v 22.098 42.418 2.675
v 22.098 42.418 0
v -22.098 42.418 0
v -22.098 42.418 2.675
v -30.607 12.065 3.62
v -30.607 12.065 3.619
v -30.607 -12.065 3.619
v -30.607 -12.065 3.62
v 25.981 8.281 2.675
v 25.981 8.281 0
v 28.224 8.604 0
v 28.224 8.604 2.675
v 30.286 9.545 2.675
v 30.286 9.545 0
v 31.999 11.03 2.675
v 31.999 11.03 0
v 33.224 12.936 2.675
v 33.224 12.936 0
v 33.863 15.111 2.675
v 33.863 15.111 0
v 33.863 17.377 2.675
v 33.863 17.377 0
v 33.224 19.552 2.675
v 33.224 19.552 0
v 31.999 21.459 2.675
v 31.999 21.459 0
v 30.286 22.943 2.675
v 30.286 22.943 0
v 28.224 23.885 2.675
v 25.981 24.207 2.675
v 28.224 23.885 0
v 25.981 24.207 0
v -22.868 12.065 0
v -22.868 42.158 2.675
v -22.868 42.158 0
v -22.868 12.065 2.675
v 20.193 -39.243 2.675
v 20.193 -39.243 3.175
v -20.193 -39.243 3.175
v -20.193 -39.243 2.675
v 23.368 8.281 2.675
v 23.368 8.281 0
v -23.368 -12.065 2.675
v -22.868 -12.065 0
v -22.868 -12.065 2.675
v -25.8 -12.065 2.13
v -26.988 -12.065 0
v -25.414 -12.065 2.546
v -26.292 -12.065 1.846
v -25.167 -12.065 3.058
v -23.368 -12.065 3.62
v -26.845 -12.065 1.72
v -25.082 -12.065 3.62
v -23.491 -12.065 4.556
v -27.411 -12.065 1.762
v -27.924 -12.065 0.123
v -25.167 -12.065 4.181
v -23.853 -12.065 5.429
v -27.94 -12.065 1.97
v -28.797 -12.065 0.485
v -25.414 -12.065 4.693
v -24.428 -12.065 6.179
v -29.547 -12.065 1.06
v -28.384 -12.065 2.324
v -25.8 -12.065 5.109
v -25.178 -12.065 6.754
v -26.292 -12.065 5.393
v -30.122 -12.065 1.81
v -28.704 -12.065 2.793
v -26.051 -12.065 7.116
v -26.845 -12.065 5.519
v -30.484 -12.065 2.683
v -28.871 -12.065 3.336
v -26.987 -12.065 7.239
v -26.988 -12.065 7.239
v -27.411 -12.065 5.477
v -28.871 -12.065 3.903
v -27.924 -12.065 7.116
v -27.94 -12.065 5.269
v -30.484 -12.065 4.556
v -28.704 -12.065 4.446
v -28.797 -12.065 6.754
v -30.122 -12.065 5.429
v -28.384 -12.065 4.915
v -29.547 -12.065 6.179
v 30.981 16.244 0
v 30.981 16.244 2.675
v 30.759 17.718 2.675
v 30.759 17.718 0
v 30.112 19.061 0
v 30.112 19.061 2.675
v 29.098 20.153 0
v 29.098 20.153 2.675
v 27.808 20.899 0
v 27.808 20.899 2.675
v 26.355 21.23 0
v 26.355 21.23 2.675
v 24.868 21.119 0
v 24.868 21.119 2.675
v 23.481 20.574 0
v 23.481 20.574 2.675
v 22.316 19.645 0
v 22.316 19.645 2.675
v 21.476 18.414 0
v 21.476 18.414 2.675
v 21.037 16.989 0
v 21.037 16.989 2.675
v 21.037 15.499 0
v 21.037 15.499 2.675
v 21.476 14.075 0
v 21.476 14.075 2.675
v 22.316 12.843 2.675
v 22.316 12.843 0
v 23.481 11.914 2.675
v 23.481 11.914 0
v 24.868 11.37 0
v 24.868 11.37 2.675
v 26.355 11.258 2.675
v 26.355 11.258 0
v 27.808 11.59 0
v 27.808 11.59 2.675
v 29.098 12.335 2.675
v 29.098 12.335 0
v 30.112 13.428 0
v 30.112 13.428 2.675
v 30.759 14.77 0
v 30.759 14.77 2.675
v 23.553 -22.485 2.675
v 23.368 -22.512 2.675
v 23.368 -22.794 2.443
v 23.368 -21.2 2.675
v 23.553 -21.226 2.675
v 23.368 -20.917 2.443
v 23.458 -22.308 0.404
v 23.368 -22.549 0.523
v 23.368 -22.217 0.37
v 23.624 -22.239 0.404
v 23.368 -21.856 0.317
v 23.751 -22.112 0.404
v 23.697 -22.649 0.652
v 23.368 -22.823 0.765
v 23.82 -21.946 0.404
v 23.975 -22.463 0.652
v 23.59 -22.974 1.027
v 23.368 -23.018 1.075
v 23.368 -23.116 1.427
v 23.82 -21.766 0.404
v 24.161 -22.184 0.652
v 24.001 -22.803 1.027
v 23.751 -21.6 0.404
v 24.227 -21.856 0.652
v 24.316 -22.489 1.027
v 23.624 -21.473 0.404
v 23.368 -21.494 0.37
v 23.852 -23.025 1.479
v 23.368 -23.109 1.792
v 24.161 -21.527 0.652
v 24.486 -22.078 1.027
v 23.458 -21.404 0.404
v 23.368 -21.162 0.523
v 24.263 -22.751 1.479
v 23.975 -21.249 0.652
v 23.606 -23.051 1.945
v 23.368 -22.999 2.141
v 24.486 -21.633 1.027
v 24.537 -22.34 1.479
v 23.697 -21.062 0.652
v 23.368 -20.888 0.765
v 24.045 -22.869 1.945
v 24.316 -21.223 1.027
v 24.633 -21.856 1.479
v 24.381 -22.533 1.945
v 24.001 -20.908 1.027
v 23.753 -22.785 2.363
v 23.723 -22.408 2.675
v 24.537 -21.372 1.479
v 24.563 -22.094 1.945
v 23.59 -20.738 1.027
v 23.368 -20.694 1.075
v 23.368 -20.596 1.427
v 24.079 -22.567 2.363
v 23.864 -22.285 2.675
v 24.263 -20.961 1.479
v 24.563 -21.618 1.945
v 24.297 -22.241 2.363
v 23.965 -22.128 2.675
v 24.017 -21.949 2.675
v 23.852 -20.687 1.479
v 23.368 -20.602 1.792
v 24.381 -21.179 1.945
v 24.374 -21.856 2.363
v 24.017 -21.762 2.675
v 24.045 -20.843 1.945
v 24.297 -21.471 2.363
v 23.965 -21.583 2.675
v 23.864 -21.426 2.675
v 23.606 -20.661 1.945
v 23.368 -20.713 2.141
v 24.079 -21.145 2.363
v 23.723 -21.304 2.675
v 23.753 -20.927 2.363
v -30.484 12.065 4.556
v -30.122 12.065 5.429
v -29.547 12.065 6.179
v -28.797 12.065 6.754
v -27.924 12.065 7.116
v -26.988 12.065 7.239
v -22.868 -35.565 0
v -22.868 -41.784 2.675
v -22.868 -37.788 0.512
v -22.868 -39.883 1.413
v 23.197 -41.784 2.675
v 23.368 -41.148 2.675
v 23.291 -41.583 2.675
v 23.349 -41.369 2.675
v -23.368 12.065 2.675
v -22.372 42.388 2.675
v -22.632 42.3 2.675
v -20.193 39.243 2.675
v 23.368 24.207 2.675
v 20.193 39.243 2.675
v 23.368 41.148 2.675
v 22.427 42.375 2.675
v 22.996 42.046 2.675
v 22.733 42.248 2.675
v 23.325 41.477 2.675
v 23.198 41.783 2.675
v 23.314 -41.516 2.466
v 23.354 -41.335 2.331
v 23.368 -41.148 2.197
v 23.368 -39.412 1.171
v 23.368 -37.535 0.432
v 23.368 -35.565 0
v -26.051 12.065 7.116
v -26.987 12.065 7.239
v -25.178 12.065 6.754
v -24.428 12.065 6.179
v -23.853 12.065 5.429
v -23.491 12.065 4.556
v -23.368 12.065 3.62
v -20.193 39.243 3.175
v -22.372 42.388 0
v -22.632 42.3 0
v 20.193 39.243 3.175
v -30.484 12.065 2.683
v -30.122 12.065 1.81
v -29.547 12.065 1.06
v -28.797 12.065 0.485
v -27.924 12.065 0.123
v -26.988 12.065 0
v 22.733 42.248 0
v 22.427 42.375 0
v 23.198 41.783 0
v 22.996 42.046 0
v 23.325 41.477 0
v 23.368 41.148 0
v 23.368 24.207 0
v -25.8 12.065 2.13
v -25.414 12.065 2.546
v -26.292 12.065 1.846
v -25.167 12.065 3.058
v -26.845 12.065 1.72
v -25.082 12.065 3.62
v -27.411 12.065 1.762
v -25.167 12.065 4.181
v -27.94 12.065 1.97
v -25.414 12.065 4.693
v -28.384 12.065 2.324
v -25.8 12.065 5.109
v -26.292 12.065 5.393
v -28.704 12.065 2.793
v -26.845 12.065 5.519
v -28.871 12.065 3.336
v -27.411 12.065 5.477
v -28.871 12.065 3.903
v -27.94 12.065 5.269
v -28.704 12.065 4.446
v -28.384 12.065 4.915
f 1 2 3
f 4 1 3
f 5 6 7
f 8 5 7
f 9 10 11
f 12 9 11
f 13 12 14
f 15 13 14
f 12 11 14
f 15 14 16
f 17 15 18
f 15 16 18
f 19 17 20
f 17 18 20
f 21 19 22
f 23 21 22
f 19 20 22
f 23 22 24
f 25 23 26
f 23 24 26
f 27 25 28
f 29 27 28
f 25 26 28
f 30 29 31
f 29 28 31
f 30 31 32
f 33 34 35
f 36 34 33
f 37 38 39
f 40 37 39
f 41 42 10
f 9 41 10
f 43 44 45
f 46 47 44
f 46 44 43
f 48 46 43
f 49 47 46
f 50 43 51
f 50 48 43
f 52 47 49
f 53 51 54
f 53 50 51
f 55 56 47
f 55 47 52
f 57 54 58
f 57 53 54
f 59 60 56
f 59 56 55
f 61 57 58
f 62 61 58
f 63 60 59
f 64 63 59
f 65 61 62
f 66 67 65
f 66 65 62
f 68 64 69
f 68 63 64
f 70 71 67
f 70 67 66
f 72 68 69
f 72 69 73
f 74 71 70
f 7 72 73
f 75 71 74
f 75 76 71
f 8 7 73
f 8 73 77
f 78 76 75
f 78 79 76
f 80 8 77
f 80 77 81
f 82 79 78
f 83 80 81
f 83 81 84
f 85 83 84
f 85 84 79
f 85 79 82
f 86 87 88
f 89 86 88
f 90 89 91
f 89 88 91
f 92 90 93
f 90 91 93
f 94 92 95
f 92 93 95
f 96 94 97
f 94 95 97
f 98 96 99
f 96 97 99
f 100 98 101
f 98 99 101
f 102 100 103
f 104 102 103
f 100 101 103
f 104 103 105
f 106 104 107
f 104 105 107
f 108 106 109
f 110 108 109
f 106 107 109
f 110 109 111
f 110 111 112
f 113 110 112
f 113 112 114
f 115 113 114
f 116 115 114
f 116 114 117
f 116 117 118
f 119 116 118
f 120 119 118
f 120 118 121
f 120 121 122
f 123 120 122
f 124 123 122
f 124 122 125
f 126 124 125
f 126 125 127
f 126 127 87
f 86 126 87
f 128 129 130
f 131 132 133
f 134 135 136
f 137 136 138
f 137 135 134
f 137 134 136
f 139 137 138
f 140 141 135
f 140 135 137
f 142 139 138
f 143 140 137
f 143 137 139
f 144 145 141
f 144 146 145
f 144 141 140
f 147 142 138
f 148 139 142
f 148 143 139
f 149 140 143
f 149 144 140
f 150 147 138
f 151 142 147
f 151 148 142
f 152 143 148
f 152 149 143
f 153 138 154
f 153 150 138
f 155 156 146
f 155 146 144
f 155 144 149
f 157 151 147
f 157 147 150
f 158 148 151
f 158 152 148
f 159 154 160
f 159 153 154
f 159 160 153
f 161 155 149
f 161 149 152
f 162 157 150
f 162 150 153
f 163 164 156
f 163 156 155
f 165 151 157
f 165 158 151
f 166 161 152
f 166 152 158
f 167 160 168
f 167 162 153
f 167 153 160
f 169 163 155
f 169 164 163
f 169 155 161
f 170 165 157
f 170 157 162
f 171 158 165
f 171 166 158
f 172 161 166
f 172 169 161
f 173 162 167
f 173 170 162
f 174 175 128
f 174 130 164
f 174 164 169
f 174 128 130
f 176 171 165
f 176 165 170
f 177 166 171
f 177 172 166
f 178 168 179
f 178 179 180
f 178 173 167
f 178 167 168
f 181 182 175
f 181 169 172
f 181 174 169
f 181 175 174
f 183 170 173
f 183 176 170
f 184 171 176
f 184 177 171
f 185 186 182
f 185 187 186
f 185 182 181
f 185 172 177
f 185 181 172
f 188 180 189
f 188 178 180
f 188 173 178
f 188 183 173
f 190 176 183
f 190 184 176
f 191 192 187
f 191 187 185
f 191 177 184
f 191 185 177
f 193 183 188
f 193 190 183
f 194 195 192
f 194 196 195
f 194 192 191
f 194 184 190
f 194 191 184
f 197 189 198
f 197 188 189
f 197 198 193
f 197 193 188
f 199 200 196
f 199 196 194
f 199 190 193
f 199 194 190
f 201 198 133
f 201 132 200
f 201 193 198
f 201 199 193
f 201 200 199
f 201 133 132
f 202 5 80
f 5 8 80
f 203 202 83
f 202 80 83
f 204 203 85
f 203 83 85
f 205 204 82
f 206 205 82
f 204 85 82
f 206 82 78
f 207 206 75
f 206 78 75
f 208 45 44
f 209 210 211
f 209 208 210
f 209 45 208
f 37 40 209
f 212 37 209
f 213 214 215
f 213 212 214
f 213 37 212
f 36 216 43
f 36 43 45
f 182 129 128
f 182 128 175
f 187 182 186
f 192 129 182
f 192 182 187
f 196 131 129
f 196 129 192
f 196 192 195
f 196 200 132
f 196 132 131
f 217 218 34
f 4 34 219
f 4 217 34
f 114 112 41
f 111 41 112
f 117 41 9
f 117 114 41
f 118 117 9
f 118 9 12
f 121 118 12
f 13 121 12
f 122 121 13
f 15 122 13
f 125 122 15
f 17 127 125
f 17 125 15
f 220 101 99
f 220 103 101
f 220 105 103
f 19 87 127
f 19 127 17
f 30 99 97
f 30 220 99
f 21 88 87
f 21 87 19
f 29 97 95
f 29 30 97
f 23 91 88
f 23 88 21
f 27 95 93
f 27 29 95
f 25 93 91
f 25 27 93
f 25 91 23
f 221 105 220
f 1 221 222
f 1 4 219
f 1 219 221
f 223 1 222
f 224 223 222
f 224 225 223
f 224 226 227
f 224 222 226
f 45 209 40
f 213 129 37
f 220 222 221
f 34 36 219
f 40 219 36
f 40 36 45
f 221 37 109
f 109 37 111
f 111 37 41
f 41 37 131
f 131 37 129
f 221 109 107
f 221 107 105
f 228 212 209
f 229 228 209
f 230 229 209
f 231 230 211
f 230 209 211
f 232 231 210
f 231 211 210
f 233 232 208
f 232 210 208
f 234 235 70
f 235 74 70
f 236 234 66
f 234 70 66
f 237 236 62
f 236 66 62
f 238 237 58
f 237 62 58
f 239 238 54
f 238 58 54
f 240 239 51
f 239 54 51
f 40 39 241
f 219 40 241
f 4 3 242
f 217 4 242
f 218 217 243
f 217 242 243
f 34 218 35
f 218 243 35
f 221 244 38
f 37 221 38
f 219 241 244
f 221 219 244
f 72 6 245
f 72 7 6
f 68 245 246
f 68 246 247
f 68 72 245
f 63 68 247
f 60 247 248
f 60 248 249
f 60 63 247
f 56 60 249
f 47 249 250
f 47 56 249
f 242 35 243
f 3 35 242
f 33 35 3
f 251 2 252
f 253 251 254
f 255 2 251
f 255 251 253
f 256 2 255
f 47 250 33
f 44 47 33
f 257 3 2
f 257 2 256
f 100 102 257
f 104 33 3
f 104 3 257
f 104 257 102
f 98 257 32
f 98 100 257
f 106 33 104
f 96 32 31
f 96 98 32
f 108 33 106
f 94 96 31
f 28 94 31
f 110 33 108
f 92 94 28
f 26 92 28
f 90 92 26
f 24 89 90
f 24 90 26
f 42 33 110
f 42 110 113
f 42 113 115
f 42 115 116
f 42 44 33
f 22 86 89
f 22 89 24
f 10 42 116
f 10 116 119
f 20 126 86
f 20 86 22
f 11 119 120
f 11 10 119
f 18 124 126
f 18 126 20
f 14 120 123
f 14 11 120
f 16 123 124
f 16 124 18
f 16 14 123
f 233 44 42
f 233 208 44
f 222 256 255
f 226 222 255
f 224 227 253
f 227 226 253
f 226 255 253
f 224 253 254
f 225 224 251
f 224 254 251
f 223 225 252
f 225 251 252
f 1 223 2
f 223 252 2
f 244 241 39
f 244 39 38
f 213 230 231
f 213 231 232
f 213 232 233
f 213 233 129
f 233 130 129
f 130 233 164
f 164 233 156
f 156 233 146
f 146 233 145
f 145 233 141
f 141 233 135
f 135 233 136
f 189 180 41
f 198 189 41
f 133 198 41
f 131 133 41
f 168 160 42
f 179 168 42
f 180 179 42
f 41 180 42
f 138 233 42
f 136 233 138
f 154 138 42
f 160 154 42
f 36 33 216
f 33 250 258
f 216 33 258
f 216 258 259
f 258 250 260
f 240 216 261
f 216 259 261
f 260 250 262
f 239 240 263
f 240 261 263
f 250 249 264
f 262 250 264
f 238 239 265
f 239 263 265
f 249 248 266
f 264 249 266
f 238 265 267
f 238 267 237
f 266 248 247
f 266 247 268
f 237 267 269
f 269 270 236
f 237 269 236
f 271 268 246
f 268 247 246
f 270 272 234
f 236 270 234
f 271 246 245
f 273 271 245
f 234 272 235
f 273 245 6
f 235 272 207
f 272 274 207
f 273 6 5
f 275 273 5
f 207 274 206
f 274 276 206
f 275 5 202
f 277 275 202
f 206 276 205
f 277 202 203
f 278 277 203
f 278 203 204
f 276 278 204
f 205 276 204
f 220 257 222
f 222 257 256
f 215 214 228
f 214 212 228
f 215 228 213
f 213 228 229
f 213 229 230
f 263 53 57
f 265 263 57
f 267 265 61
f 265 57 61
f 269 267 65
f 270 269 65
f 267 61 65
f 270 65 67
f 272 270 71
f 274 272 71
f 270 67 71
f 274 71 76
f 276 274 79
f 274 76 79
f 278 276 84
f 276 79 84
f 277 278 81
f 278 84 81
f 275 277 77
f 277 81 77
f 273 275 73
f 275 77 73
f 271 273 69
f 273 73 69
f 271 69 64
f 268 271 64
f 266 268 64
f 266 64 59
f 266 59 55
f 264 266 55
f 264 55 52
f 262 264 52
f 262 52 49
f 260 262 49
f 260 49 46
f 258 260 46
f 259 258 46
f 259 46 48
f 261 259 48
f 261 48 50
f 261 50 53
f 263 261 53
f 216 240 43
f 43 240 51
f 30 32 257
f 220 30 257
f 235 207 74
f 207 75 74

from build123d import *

# Parameters (mm, degrees)
F1_DEPTH  = 3.175
F2_R      = 5
F3_DEPTH  = 3.175
F4_W      = 7.239
F4_H      = 24.13
F5_DEPTH  = 7.239
F6_R      = 1.905
F7_DEPTH  = 25.4
F8_R      = 3.6195
F9_R      = 3.61949
F10_R     = 3.61949
F13_W     = 3.2799700804
F13_H     = 6.7503359169
F14_DEPTH = 0.5
F15_W     = 30.353
F15_H     = 2.675
F16_DEPTH = 0.5
F18_DEPTH = 46.236


# Not quite as in the source:
# - a fillet or chamfer is up to 0.001 mm smaller than in the source, because OpenCascade refuses the exact size


with BuildPart() as f1:
    # F0 (on Top) → F1 (new body)
    with BuildSketch(Plane.XY):
        with BuildLine():
            ThreePointArc((23.368, 41.148), (22.9960256121, 42.0460256121), (22.098, 42.418))
            Line((22.098, 42.418), (-22.098, 42.418))
            ThreePointArc((-22.098, 42.418), (-22.9960256121, 42.0460256121), (-23.368, 41.148))
            Line((-23.368, 41.148), (-23.368, -41.148))
            ThreePointArc((-23.368, -41.148), (-22.9960256121, -42.0460256121), (-22.098, -42.418))
            Line((-22.098, -42.418), (22.098, -42.418))
            ThreePointArc((22.098, -42.418), (22.9960256121, -42.0460256121), (23.368, -41.148))
            Line((23.368, -41.148), (23.368, 8.2812636))
            Line((23.368, 8.2812636), (23.368, 24.2070636))
            Line((23.368, 24.2070636), (23.368, 41.148))
        make_face()
        with BuildLine():
            Line((25.980898, 24.2070636), (23.368, 24.2070636))
            Line((23.368, 24.2070636), (23.368, 8.2812636))
            Line((23.368, 8.2812636), (25.980898, 8.2812636))
            ThreePointArc((25.980898, 8.2812636), (33.943798, 16.2441636), (25.980898, 24.2070636))
        make_face()
    extrude(amount=F1_DEPTH)

    # F2 (on face) → F3 (cut)
    with BuildSketch(Plane.XY.offset(3.175)):
        with Locations((25.980898, 16.2441636)):
            Circle(F2_R)
    extrude(amount=-F3_DEPTH, mode=Mode.SUBTRACT)

    # F4 (on face) → F5 (join)
    with BuildSketch(Plane(origin=(0, 0, 0), x_dir=(1, 0, 0), z_dir=(0, 0, -1))):
        with Locations((-26.9875, 0)):
            Rectangle(F4_W, F4_H)
    extrude(amount=-F5_DEPTH)

    # F6 (on face) → F7 (cut)
    with BuildSketch(Plane.XZ.offset(12.065)):
        with Locations((-26.9875, 3.6195)):
            Circle(F6_R)
    extrude(amount=-F7_DEPTH, mode=Mode.SUBTRACT)

    # F8
    f8_edges = [f1.edges().sort_by_distance(p)[0] for p in [
        (-30.607, 0, 7.239),
    ]]
    fillet(f8_edges, radius=F8_R)

    # F9 (radius 3.6195 in the source; OpenCascade refuses exactly that, so slightly less here)
    f9_edges = [f1.edges().sort_by_distance(p)[0] for p in [
        (-23.368, 0, 7.239),
    ]]
    fillet(f9_edges, radius=F9_R)

    # F10 (radius 3.6195 in the source; OpenCascade refuses exactly that, so slightly less here)
    f10_edges = [f1.edges().sort_by_distance(p)[0] for p in [
        (-30.607, 0, 0),
    ]]
    fillet(f10_edges, radius=F10_R)

    # F11 (on face) → F12 (revolve)
    with BuildSketch(Plane.YZ.offset(23.368)):
        with BuildLine():
            Line((-21.8558364, 2.8575), (-21.8558364, 0.3175))
            ThreePointArc((-21.8558364, 0.3175), (-20.5858364, 1.5875), (-21.8558364, 2.8575))
        make_face()
    revolve(axis=Axis((23.368, -21.8558364, 1.4411548618), (0, 0, 1)))

    # F13 (on face) → F14 (cut)
    with BuildSketch(Plane.XY.offset(3.175)):
        with BuildLine():
            Line((-23.368, -12.065), (-23.368, -42.418))
            Line((-23.368, -42.418), (23.368, -42.418))
            Line((23.368, -42.418), (23.368, -25.3541376442))
            Line((23.368, -25.3541376442), (23.368, -18.6038017273))
            Line((23.368, -18.6038017273), (23.368, 8.2812636))
            Line((23.368, 8.2812636), (25.980898, 8.2812636))
            ThreePointArc((25.980898, 8.2812636), (33.943798, 16.2441636), (25.980898, 24.2070636))
            Line((25.980898, 24.2070636), (23.368, 24.2070636))
            Line((23.368, 24.2070636), (23.368, 42.418))
            Line((23.368, 42.418), (-23.368, 42.418))
            Line((-23.368, 42.418), (-23.368, 12.065))
            Line((-23.368, 12.065), (-23.368, -12.065))
        make_face()
        Polygon((-20.193, 39.243), (20.193, 39.243), (20.193, 22.1750636), (20.193, 10.3132636), (20.193, -39.243), (-20.193, -39.243), (-20.193, -12.065), (-20.193, 12.065), align=None, mode=Mode.SUBTRACT)
        with Locations((25.0079850402, -21.9789696857)):
            Rectangle(F13_W, F13_H)
    extrude(amount=-F14_DEPTH, mode=Mode.SUBTRACT)

    # F15 (on face) → F16 (cut)
    with BuildSketch(Plane(origin=(-23.368, 0, 0), x_dir=(0, -1, 0), z_dir=(-1, 0, 0))):
        with Locations((-27.2415, 1.3375)):
            Rectangle(F15_W, F15_H)
        with Locations((27.2415, 1.3375)):
            Rectangle(F15_W, F15_H)
    extrude(amount=-F16_DEPTH, mode=Mode.SUBTRACT)

    # F17 (on face) → F18 (cut, through all)
    with BuildSketch(Plane(origin=(-22.868, 0, 0), x_dir=(0, -1, 0), z_dir=(-1, 0, 0))):
        with BuildLine():
            ThreePointArc((44.0055, 4.9726288032), (40.2838486613, 1.63965752), (35.5646422155, 0))
            Line((35.5646422155, 0), (44.0055, 0))
            Line((44.0055, 0), (44.0055, 4.9726288032))
        make_face()
    extrude(amount=-F18_DEPTH, mode=Mode.SUBTRACT)


solid = f1.part
